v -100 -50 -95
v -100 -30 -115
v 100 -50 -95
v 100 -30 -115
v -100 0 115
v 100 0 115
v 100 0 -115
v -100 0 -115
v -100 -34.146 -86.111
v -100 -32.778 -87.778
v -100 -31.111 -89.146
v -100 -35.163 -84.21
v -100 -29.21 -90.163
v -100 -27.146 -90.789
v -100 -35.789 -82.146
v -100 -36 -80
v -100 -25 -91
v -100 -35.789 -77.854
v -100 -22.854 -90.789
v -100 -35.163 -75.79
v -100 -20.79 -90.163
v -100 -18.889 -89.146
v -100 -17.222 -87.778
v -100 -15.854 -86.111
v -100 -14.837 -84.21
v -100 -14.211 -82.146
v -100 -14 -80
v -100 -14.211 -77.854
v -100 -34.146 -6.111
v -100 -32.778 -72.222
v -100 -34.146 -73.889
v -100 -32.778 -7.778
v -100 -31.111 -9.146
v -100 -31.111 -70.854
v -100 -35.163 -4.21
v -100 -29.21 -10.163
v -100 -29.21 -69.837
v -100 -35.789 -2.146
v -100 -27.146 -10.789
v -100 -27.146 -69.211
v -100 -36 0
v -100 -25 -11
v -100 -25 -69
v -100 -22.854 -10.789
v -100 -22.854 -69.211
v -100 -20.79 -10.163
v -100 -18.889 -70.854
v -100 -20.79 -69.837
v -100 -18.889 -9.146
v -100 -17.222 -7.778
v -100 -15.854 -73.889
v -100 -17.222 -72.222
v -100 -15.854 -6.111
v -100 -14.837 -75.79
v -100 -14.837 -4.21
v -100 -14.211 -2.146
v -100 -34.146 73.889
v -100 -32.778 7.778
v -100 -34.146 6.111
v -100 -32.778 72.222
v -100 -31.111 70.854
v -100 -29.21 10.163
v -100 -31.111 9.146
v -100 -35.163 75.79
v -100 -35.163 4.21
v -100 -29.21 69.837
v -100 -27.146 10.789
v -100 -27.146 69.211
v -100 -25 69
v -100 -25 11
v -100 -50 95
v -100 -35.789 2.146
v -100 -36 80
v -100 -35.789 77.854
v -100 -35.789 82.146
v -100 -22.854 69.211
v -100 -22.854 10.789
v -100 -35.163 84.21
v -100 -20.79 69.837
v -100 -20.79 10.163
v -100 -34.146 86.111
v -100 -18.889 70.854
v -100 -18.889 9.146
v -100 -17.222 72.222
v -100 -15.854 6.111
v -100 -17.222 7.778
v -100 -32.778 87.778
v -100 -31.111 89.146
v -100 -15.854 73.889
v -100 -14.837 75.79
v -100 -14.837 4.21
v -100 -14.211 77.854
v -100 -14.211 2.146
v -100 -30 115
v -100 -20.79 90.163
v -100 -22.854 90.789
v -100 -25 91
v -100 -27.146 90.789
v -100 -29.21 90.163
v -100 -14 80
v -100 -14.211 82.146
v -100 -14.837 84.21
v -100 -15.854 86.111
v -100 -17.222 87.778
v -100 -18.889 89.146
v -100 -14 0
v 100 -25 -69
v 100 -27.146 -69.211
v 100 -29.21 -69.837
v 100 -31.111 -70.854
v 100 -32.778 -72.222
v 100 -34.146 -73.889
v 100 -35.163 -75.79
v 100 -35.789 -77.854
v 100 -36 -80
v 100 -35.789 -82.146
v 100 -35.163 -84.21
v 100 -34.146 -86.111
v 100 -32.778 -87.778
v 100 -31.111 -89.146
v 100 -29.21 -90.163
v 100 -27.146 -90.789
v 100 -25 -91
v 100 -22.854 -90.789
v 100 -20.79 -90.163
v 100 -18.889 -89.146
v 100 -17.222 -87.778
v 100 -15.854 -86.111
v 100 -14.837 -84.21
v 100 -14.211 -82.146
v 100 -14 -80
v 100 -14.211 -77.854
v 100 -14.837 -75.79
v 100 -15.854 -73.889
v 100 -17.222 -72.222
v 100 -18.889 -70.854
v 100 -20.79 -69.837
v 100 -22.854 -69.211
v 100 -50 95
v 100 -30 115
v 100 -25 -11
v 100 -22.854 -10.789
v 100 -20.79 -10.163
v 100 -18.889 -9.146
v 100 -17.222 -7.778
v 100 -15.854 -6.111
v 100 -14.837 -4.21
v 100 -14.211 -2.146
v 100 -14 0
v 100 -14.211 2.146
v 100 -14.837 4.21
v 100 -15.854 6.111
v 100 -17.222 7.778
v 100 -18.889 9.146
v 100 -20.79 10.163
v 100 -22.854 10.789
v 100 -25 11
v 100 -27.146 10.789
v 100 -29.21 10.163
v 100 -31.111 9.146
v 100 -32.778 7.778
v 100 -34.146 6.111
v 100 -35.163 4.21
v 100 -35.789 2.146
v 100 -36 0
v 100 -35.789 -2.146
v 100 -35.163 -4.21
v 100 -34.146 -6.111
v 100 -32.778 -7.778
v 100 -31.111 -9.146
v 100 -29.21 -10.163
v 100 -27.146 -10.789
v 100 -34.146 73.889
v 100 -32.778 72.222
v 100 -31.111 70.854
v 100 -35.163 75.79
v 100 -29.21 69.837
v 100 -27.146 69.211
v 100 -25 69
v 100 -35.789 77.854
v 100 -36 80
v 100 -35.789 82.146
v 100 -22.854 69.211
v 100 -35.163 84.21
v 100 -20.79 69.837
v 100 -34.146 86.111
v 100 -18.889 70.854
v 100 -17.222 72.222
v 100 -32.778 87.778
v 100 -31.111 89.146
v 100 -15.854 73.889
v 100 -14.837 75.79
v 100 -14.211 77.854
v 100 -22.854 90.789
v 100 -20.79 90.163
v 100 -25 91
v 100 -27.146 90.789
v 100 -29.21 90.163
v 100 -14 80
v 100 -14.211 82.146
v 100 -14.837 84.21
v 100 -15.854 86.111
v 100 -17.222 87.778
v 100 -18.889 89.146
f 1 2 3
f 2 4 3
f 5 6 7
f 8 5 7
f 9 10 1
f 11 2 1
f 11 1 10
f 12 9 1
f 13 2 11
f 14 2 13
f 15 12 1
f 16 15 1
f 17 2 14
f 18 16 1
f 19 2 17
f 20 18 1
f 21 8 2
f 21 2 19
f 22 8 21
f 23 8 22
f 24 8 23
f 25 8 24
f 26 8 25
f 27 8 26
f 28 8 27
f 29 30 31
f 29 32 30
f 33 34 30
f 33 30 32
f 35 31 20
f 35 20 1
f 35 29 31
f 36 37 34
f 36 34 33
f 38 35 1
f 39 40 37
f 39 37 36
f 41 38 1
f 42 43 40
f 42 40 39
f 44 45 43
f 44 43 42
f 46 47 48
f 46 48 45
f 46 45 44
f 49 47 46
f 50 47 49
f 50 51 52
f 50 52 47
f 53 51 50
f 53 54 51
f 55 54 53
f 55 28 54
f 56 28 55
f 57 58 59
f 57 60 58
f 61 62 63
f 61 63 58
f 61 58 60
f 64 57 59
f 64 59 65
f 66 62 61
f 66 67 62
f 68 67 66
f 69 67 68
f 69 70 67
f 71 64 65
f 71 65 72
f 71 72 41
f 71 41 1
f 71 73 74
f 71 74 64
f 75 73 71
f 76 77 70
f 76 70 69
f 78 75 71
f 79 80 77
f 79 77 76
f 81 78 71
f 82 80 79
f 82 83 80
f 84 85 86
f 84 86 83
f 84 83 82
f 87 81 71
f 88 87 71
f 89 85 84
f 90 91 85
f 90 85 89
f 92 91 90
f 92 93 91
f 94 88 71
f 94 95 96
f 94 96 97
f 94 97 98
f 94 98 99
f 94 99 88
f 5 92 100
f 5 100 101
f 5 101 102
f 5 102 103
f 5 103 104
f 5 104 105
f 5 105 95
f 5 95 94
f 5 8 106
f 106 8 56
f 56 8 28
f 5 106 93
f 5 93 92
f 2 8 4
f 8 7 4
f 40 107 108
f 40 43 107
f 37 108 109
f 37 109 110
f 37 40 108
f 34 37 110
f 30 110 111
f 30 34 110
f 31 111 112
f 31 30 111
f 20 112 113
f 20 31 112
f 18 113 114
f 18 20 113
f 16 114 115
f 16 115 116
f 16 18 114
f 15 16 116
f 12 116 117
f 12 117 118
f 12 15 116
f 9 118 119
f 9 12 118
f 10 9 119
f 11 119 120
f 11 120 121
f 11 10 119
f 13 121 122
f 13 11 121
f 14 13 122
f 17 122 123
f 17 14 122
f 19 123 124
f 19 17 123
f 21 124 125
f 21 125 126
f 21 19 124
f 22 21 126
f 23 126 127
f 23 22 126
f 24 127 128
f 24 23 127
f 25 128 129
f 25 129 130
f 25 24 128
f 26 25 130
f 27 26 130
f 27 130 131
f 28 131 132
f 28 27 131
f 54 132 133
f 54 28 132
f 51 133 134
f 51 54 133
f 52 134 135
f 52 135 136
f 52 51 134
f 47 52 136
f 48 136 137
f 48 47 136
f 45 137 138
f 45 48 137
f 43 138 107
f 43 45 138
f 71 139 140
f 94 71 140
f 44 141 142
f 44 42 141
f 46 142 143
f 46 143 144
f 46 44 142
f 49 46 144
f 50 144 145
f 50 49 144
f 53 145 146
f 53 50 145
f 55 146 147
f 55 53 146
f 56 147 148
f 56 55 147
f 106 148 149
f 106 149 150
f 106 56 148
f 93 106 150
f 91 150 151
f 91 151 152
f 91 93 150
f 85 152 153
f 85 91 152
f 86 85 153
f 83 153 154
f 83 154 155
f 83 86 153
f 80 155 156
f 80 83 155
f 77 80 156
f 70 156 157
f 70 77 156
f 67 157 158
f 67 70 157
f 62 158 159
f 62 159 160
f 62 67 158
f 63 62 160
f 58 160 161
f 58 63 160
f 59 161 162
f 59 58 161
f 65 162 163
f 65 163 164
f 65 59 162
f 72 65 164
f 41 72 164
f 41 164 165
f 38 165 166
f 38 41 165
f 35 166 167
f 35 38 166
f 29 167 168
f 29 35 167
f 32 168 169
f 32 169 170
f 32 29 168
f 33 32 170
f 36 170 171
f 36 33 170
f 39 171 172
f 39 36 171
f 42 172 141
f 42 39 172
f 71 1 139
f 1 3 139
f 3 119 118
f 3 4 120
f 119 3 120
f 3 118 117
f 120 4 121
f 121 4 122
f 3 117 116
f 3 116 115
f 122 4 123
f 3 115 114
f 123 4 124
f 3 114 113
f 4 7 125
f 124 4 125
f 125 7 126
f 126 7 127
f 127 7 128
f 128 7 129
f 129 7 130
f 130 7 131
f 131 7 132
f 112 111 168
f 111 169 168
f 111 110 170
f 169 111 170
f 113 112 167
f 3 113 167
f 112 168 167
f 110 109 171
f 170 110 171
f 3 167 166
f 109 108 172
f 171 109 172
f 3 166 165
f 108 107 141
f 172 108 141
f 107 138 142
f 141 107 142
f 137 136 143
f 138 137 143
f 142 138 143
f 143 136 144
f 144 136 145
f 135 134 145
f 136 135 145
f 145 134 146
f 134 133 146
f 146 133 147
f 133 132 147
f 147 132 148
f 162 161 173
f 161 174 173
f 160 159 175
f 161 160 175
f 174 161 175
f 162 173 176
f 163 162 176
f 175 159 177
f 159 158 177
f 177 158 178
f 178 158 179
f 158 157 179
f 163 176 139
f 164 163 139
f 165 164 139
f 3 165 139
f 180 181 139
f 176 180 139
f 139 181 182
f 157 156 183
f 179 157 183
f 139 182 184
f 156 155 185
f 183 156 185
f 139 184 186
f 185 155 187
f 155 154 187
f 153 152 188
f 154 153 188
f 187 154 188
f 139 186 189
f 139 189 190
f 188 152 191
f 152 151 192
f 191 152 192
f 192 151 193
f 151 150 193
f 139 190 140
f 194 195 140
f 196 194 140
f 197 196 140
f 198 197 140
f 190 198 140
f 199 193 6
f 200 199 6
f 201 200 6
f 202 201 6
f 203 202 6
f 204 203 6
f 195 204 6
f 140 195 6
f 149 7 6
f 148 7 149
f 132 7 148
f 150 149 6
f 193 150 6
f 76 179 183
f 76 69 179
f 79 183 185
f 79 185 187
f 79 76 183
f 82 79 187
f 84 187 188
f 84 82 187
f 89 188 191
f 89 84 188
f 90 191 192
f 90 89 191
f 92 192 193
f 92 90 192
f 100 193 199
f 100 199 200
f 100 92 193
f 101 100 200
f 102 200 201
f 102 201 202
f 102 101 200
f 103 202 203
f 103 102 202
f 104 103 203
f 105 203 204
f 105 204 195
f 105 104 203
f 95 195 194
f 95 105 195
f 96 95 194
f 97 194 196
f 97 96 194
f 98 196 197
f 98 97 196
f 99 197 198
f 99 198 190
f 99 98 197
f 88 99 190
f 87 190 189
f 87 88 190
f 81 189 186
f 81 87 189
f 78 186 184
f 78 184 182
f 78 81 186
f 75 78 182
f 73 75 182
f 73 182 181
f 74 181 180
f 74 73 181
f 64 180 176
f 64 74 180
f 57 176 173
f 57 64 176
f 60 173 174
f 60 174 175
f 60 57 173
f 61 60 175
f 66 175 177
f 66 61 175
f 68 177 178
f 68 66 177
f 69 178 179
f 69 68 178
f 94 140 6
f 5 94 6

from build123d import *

# Parameters (mm, degrees)
SKIZZE1_R                       = 11
AUFSATZ_LINEAR_AUSTRAGEN1_DEPTH = 100


with BuildPart() as part:
    # Skizze1 → Aufsatz-Linear austragen1 (new, symmetric)
    with BuildSketch(Plane(origin=(0, 0, 0), x_dir=(0, 0, -1), z_dir=(1, 0, 0))):
        Polygon((-115, 0), (115, 0), (115, -30), (95, -50), (-95, -50), (-115, -30), align=None)
        with Locations((0, -25)):
            Circle(SKIZZE1_R, mode=Mode.SUBTRACT)
        with Locations((-80, -25)):
            Circle(SKIZZE1_R, mode=Mode.SUBTRACT)
        with Locations(Location((80, -25, 0), (0, 0, 180))):
            Circle(SKIZZE1_R, mode=Mode.SUBTRACT)
    extrude(amount=AUFSATZ_LINEAR_AUSTRAGEN1_DEPTH, both=True)


solid = part.part
